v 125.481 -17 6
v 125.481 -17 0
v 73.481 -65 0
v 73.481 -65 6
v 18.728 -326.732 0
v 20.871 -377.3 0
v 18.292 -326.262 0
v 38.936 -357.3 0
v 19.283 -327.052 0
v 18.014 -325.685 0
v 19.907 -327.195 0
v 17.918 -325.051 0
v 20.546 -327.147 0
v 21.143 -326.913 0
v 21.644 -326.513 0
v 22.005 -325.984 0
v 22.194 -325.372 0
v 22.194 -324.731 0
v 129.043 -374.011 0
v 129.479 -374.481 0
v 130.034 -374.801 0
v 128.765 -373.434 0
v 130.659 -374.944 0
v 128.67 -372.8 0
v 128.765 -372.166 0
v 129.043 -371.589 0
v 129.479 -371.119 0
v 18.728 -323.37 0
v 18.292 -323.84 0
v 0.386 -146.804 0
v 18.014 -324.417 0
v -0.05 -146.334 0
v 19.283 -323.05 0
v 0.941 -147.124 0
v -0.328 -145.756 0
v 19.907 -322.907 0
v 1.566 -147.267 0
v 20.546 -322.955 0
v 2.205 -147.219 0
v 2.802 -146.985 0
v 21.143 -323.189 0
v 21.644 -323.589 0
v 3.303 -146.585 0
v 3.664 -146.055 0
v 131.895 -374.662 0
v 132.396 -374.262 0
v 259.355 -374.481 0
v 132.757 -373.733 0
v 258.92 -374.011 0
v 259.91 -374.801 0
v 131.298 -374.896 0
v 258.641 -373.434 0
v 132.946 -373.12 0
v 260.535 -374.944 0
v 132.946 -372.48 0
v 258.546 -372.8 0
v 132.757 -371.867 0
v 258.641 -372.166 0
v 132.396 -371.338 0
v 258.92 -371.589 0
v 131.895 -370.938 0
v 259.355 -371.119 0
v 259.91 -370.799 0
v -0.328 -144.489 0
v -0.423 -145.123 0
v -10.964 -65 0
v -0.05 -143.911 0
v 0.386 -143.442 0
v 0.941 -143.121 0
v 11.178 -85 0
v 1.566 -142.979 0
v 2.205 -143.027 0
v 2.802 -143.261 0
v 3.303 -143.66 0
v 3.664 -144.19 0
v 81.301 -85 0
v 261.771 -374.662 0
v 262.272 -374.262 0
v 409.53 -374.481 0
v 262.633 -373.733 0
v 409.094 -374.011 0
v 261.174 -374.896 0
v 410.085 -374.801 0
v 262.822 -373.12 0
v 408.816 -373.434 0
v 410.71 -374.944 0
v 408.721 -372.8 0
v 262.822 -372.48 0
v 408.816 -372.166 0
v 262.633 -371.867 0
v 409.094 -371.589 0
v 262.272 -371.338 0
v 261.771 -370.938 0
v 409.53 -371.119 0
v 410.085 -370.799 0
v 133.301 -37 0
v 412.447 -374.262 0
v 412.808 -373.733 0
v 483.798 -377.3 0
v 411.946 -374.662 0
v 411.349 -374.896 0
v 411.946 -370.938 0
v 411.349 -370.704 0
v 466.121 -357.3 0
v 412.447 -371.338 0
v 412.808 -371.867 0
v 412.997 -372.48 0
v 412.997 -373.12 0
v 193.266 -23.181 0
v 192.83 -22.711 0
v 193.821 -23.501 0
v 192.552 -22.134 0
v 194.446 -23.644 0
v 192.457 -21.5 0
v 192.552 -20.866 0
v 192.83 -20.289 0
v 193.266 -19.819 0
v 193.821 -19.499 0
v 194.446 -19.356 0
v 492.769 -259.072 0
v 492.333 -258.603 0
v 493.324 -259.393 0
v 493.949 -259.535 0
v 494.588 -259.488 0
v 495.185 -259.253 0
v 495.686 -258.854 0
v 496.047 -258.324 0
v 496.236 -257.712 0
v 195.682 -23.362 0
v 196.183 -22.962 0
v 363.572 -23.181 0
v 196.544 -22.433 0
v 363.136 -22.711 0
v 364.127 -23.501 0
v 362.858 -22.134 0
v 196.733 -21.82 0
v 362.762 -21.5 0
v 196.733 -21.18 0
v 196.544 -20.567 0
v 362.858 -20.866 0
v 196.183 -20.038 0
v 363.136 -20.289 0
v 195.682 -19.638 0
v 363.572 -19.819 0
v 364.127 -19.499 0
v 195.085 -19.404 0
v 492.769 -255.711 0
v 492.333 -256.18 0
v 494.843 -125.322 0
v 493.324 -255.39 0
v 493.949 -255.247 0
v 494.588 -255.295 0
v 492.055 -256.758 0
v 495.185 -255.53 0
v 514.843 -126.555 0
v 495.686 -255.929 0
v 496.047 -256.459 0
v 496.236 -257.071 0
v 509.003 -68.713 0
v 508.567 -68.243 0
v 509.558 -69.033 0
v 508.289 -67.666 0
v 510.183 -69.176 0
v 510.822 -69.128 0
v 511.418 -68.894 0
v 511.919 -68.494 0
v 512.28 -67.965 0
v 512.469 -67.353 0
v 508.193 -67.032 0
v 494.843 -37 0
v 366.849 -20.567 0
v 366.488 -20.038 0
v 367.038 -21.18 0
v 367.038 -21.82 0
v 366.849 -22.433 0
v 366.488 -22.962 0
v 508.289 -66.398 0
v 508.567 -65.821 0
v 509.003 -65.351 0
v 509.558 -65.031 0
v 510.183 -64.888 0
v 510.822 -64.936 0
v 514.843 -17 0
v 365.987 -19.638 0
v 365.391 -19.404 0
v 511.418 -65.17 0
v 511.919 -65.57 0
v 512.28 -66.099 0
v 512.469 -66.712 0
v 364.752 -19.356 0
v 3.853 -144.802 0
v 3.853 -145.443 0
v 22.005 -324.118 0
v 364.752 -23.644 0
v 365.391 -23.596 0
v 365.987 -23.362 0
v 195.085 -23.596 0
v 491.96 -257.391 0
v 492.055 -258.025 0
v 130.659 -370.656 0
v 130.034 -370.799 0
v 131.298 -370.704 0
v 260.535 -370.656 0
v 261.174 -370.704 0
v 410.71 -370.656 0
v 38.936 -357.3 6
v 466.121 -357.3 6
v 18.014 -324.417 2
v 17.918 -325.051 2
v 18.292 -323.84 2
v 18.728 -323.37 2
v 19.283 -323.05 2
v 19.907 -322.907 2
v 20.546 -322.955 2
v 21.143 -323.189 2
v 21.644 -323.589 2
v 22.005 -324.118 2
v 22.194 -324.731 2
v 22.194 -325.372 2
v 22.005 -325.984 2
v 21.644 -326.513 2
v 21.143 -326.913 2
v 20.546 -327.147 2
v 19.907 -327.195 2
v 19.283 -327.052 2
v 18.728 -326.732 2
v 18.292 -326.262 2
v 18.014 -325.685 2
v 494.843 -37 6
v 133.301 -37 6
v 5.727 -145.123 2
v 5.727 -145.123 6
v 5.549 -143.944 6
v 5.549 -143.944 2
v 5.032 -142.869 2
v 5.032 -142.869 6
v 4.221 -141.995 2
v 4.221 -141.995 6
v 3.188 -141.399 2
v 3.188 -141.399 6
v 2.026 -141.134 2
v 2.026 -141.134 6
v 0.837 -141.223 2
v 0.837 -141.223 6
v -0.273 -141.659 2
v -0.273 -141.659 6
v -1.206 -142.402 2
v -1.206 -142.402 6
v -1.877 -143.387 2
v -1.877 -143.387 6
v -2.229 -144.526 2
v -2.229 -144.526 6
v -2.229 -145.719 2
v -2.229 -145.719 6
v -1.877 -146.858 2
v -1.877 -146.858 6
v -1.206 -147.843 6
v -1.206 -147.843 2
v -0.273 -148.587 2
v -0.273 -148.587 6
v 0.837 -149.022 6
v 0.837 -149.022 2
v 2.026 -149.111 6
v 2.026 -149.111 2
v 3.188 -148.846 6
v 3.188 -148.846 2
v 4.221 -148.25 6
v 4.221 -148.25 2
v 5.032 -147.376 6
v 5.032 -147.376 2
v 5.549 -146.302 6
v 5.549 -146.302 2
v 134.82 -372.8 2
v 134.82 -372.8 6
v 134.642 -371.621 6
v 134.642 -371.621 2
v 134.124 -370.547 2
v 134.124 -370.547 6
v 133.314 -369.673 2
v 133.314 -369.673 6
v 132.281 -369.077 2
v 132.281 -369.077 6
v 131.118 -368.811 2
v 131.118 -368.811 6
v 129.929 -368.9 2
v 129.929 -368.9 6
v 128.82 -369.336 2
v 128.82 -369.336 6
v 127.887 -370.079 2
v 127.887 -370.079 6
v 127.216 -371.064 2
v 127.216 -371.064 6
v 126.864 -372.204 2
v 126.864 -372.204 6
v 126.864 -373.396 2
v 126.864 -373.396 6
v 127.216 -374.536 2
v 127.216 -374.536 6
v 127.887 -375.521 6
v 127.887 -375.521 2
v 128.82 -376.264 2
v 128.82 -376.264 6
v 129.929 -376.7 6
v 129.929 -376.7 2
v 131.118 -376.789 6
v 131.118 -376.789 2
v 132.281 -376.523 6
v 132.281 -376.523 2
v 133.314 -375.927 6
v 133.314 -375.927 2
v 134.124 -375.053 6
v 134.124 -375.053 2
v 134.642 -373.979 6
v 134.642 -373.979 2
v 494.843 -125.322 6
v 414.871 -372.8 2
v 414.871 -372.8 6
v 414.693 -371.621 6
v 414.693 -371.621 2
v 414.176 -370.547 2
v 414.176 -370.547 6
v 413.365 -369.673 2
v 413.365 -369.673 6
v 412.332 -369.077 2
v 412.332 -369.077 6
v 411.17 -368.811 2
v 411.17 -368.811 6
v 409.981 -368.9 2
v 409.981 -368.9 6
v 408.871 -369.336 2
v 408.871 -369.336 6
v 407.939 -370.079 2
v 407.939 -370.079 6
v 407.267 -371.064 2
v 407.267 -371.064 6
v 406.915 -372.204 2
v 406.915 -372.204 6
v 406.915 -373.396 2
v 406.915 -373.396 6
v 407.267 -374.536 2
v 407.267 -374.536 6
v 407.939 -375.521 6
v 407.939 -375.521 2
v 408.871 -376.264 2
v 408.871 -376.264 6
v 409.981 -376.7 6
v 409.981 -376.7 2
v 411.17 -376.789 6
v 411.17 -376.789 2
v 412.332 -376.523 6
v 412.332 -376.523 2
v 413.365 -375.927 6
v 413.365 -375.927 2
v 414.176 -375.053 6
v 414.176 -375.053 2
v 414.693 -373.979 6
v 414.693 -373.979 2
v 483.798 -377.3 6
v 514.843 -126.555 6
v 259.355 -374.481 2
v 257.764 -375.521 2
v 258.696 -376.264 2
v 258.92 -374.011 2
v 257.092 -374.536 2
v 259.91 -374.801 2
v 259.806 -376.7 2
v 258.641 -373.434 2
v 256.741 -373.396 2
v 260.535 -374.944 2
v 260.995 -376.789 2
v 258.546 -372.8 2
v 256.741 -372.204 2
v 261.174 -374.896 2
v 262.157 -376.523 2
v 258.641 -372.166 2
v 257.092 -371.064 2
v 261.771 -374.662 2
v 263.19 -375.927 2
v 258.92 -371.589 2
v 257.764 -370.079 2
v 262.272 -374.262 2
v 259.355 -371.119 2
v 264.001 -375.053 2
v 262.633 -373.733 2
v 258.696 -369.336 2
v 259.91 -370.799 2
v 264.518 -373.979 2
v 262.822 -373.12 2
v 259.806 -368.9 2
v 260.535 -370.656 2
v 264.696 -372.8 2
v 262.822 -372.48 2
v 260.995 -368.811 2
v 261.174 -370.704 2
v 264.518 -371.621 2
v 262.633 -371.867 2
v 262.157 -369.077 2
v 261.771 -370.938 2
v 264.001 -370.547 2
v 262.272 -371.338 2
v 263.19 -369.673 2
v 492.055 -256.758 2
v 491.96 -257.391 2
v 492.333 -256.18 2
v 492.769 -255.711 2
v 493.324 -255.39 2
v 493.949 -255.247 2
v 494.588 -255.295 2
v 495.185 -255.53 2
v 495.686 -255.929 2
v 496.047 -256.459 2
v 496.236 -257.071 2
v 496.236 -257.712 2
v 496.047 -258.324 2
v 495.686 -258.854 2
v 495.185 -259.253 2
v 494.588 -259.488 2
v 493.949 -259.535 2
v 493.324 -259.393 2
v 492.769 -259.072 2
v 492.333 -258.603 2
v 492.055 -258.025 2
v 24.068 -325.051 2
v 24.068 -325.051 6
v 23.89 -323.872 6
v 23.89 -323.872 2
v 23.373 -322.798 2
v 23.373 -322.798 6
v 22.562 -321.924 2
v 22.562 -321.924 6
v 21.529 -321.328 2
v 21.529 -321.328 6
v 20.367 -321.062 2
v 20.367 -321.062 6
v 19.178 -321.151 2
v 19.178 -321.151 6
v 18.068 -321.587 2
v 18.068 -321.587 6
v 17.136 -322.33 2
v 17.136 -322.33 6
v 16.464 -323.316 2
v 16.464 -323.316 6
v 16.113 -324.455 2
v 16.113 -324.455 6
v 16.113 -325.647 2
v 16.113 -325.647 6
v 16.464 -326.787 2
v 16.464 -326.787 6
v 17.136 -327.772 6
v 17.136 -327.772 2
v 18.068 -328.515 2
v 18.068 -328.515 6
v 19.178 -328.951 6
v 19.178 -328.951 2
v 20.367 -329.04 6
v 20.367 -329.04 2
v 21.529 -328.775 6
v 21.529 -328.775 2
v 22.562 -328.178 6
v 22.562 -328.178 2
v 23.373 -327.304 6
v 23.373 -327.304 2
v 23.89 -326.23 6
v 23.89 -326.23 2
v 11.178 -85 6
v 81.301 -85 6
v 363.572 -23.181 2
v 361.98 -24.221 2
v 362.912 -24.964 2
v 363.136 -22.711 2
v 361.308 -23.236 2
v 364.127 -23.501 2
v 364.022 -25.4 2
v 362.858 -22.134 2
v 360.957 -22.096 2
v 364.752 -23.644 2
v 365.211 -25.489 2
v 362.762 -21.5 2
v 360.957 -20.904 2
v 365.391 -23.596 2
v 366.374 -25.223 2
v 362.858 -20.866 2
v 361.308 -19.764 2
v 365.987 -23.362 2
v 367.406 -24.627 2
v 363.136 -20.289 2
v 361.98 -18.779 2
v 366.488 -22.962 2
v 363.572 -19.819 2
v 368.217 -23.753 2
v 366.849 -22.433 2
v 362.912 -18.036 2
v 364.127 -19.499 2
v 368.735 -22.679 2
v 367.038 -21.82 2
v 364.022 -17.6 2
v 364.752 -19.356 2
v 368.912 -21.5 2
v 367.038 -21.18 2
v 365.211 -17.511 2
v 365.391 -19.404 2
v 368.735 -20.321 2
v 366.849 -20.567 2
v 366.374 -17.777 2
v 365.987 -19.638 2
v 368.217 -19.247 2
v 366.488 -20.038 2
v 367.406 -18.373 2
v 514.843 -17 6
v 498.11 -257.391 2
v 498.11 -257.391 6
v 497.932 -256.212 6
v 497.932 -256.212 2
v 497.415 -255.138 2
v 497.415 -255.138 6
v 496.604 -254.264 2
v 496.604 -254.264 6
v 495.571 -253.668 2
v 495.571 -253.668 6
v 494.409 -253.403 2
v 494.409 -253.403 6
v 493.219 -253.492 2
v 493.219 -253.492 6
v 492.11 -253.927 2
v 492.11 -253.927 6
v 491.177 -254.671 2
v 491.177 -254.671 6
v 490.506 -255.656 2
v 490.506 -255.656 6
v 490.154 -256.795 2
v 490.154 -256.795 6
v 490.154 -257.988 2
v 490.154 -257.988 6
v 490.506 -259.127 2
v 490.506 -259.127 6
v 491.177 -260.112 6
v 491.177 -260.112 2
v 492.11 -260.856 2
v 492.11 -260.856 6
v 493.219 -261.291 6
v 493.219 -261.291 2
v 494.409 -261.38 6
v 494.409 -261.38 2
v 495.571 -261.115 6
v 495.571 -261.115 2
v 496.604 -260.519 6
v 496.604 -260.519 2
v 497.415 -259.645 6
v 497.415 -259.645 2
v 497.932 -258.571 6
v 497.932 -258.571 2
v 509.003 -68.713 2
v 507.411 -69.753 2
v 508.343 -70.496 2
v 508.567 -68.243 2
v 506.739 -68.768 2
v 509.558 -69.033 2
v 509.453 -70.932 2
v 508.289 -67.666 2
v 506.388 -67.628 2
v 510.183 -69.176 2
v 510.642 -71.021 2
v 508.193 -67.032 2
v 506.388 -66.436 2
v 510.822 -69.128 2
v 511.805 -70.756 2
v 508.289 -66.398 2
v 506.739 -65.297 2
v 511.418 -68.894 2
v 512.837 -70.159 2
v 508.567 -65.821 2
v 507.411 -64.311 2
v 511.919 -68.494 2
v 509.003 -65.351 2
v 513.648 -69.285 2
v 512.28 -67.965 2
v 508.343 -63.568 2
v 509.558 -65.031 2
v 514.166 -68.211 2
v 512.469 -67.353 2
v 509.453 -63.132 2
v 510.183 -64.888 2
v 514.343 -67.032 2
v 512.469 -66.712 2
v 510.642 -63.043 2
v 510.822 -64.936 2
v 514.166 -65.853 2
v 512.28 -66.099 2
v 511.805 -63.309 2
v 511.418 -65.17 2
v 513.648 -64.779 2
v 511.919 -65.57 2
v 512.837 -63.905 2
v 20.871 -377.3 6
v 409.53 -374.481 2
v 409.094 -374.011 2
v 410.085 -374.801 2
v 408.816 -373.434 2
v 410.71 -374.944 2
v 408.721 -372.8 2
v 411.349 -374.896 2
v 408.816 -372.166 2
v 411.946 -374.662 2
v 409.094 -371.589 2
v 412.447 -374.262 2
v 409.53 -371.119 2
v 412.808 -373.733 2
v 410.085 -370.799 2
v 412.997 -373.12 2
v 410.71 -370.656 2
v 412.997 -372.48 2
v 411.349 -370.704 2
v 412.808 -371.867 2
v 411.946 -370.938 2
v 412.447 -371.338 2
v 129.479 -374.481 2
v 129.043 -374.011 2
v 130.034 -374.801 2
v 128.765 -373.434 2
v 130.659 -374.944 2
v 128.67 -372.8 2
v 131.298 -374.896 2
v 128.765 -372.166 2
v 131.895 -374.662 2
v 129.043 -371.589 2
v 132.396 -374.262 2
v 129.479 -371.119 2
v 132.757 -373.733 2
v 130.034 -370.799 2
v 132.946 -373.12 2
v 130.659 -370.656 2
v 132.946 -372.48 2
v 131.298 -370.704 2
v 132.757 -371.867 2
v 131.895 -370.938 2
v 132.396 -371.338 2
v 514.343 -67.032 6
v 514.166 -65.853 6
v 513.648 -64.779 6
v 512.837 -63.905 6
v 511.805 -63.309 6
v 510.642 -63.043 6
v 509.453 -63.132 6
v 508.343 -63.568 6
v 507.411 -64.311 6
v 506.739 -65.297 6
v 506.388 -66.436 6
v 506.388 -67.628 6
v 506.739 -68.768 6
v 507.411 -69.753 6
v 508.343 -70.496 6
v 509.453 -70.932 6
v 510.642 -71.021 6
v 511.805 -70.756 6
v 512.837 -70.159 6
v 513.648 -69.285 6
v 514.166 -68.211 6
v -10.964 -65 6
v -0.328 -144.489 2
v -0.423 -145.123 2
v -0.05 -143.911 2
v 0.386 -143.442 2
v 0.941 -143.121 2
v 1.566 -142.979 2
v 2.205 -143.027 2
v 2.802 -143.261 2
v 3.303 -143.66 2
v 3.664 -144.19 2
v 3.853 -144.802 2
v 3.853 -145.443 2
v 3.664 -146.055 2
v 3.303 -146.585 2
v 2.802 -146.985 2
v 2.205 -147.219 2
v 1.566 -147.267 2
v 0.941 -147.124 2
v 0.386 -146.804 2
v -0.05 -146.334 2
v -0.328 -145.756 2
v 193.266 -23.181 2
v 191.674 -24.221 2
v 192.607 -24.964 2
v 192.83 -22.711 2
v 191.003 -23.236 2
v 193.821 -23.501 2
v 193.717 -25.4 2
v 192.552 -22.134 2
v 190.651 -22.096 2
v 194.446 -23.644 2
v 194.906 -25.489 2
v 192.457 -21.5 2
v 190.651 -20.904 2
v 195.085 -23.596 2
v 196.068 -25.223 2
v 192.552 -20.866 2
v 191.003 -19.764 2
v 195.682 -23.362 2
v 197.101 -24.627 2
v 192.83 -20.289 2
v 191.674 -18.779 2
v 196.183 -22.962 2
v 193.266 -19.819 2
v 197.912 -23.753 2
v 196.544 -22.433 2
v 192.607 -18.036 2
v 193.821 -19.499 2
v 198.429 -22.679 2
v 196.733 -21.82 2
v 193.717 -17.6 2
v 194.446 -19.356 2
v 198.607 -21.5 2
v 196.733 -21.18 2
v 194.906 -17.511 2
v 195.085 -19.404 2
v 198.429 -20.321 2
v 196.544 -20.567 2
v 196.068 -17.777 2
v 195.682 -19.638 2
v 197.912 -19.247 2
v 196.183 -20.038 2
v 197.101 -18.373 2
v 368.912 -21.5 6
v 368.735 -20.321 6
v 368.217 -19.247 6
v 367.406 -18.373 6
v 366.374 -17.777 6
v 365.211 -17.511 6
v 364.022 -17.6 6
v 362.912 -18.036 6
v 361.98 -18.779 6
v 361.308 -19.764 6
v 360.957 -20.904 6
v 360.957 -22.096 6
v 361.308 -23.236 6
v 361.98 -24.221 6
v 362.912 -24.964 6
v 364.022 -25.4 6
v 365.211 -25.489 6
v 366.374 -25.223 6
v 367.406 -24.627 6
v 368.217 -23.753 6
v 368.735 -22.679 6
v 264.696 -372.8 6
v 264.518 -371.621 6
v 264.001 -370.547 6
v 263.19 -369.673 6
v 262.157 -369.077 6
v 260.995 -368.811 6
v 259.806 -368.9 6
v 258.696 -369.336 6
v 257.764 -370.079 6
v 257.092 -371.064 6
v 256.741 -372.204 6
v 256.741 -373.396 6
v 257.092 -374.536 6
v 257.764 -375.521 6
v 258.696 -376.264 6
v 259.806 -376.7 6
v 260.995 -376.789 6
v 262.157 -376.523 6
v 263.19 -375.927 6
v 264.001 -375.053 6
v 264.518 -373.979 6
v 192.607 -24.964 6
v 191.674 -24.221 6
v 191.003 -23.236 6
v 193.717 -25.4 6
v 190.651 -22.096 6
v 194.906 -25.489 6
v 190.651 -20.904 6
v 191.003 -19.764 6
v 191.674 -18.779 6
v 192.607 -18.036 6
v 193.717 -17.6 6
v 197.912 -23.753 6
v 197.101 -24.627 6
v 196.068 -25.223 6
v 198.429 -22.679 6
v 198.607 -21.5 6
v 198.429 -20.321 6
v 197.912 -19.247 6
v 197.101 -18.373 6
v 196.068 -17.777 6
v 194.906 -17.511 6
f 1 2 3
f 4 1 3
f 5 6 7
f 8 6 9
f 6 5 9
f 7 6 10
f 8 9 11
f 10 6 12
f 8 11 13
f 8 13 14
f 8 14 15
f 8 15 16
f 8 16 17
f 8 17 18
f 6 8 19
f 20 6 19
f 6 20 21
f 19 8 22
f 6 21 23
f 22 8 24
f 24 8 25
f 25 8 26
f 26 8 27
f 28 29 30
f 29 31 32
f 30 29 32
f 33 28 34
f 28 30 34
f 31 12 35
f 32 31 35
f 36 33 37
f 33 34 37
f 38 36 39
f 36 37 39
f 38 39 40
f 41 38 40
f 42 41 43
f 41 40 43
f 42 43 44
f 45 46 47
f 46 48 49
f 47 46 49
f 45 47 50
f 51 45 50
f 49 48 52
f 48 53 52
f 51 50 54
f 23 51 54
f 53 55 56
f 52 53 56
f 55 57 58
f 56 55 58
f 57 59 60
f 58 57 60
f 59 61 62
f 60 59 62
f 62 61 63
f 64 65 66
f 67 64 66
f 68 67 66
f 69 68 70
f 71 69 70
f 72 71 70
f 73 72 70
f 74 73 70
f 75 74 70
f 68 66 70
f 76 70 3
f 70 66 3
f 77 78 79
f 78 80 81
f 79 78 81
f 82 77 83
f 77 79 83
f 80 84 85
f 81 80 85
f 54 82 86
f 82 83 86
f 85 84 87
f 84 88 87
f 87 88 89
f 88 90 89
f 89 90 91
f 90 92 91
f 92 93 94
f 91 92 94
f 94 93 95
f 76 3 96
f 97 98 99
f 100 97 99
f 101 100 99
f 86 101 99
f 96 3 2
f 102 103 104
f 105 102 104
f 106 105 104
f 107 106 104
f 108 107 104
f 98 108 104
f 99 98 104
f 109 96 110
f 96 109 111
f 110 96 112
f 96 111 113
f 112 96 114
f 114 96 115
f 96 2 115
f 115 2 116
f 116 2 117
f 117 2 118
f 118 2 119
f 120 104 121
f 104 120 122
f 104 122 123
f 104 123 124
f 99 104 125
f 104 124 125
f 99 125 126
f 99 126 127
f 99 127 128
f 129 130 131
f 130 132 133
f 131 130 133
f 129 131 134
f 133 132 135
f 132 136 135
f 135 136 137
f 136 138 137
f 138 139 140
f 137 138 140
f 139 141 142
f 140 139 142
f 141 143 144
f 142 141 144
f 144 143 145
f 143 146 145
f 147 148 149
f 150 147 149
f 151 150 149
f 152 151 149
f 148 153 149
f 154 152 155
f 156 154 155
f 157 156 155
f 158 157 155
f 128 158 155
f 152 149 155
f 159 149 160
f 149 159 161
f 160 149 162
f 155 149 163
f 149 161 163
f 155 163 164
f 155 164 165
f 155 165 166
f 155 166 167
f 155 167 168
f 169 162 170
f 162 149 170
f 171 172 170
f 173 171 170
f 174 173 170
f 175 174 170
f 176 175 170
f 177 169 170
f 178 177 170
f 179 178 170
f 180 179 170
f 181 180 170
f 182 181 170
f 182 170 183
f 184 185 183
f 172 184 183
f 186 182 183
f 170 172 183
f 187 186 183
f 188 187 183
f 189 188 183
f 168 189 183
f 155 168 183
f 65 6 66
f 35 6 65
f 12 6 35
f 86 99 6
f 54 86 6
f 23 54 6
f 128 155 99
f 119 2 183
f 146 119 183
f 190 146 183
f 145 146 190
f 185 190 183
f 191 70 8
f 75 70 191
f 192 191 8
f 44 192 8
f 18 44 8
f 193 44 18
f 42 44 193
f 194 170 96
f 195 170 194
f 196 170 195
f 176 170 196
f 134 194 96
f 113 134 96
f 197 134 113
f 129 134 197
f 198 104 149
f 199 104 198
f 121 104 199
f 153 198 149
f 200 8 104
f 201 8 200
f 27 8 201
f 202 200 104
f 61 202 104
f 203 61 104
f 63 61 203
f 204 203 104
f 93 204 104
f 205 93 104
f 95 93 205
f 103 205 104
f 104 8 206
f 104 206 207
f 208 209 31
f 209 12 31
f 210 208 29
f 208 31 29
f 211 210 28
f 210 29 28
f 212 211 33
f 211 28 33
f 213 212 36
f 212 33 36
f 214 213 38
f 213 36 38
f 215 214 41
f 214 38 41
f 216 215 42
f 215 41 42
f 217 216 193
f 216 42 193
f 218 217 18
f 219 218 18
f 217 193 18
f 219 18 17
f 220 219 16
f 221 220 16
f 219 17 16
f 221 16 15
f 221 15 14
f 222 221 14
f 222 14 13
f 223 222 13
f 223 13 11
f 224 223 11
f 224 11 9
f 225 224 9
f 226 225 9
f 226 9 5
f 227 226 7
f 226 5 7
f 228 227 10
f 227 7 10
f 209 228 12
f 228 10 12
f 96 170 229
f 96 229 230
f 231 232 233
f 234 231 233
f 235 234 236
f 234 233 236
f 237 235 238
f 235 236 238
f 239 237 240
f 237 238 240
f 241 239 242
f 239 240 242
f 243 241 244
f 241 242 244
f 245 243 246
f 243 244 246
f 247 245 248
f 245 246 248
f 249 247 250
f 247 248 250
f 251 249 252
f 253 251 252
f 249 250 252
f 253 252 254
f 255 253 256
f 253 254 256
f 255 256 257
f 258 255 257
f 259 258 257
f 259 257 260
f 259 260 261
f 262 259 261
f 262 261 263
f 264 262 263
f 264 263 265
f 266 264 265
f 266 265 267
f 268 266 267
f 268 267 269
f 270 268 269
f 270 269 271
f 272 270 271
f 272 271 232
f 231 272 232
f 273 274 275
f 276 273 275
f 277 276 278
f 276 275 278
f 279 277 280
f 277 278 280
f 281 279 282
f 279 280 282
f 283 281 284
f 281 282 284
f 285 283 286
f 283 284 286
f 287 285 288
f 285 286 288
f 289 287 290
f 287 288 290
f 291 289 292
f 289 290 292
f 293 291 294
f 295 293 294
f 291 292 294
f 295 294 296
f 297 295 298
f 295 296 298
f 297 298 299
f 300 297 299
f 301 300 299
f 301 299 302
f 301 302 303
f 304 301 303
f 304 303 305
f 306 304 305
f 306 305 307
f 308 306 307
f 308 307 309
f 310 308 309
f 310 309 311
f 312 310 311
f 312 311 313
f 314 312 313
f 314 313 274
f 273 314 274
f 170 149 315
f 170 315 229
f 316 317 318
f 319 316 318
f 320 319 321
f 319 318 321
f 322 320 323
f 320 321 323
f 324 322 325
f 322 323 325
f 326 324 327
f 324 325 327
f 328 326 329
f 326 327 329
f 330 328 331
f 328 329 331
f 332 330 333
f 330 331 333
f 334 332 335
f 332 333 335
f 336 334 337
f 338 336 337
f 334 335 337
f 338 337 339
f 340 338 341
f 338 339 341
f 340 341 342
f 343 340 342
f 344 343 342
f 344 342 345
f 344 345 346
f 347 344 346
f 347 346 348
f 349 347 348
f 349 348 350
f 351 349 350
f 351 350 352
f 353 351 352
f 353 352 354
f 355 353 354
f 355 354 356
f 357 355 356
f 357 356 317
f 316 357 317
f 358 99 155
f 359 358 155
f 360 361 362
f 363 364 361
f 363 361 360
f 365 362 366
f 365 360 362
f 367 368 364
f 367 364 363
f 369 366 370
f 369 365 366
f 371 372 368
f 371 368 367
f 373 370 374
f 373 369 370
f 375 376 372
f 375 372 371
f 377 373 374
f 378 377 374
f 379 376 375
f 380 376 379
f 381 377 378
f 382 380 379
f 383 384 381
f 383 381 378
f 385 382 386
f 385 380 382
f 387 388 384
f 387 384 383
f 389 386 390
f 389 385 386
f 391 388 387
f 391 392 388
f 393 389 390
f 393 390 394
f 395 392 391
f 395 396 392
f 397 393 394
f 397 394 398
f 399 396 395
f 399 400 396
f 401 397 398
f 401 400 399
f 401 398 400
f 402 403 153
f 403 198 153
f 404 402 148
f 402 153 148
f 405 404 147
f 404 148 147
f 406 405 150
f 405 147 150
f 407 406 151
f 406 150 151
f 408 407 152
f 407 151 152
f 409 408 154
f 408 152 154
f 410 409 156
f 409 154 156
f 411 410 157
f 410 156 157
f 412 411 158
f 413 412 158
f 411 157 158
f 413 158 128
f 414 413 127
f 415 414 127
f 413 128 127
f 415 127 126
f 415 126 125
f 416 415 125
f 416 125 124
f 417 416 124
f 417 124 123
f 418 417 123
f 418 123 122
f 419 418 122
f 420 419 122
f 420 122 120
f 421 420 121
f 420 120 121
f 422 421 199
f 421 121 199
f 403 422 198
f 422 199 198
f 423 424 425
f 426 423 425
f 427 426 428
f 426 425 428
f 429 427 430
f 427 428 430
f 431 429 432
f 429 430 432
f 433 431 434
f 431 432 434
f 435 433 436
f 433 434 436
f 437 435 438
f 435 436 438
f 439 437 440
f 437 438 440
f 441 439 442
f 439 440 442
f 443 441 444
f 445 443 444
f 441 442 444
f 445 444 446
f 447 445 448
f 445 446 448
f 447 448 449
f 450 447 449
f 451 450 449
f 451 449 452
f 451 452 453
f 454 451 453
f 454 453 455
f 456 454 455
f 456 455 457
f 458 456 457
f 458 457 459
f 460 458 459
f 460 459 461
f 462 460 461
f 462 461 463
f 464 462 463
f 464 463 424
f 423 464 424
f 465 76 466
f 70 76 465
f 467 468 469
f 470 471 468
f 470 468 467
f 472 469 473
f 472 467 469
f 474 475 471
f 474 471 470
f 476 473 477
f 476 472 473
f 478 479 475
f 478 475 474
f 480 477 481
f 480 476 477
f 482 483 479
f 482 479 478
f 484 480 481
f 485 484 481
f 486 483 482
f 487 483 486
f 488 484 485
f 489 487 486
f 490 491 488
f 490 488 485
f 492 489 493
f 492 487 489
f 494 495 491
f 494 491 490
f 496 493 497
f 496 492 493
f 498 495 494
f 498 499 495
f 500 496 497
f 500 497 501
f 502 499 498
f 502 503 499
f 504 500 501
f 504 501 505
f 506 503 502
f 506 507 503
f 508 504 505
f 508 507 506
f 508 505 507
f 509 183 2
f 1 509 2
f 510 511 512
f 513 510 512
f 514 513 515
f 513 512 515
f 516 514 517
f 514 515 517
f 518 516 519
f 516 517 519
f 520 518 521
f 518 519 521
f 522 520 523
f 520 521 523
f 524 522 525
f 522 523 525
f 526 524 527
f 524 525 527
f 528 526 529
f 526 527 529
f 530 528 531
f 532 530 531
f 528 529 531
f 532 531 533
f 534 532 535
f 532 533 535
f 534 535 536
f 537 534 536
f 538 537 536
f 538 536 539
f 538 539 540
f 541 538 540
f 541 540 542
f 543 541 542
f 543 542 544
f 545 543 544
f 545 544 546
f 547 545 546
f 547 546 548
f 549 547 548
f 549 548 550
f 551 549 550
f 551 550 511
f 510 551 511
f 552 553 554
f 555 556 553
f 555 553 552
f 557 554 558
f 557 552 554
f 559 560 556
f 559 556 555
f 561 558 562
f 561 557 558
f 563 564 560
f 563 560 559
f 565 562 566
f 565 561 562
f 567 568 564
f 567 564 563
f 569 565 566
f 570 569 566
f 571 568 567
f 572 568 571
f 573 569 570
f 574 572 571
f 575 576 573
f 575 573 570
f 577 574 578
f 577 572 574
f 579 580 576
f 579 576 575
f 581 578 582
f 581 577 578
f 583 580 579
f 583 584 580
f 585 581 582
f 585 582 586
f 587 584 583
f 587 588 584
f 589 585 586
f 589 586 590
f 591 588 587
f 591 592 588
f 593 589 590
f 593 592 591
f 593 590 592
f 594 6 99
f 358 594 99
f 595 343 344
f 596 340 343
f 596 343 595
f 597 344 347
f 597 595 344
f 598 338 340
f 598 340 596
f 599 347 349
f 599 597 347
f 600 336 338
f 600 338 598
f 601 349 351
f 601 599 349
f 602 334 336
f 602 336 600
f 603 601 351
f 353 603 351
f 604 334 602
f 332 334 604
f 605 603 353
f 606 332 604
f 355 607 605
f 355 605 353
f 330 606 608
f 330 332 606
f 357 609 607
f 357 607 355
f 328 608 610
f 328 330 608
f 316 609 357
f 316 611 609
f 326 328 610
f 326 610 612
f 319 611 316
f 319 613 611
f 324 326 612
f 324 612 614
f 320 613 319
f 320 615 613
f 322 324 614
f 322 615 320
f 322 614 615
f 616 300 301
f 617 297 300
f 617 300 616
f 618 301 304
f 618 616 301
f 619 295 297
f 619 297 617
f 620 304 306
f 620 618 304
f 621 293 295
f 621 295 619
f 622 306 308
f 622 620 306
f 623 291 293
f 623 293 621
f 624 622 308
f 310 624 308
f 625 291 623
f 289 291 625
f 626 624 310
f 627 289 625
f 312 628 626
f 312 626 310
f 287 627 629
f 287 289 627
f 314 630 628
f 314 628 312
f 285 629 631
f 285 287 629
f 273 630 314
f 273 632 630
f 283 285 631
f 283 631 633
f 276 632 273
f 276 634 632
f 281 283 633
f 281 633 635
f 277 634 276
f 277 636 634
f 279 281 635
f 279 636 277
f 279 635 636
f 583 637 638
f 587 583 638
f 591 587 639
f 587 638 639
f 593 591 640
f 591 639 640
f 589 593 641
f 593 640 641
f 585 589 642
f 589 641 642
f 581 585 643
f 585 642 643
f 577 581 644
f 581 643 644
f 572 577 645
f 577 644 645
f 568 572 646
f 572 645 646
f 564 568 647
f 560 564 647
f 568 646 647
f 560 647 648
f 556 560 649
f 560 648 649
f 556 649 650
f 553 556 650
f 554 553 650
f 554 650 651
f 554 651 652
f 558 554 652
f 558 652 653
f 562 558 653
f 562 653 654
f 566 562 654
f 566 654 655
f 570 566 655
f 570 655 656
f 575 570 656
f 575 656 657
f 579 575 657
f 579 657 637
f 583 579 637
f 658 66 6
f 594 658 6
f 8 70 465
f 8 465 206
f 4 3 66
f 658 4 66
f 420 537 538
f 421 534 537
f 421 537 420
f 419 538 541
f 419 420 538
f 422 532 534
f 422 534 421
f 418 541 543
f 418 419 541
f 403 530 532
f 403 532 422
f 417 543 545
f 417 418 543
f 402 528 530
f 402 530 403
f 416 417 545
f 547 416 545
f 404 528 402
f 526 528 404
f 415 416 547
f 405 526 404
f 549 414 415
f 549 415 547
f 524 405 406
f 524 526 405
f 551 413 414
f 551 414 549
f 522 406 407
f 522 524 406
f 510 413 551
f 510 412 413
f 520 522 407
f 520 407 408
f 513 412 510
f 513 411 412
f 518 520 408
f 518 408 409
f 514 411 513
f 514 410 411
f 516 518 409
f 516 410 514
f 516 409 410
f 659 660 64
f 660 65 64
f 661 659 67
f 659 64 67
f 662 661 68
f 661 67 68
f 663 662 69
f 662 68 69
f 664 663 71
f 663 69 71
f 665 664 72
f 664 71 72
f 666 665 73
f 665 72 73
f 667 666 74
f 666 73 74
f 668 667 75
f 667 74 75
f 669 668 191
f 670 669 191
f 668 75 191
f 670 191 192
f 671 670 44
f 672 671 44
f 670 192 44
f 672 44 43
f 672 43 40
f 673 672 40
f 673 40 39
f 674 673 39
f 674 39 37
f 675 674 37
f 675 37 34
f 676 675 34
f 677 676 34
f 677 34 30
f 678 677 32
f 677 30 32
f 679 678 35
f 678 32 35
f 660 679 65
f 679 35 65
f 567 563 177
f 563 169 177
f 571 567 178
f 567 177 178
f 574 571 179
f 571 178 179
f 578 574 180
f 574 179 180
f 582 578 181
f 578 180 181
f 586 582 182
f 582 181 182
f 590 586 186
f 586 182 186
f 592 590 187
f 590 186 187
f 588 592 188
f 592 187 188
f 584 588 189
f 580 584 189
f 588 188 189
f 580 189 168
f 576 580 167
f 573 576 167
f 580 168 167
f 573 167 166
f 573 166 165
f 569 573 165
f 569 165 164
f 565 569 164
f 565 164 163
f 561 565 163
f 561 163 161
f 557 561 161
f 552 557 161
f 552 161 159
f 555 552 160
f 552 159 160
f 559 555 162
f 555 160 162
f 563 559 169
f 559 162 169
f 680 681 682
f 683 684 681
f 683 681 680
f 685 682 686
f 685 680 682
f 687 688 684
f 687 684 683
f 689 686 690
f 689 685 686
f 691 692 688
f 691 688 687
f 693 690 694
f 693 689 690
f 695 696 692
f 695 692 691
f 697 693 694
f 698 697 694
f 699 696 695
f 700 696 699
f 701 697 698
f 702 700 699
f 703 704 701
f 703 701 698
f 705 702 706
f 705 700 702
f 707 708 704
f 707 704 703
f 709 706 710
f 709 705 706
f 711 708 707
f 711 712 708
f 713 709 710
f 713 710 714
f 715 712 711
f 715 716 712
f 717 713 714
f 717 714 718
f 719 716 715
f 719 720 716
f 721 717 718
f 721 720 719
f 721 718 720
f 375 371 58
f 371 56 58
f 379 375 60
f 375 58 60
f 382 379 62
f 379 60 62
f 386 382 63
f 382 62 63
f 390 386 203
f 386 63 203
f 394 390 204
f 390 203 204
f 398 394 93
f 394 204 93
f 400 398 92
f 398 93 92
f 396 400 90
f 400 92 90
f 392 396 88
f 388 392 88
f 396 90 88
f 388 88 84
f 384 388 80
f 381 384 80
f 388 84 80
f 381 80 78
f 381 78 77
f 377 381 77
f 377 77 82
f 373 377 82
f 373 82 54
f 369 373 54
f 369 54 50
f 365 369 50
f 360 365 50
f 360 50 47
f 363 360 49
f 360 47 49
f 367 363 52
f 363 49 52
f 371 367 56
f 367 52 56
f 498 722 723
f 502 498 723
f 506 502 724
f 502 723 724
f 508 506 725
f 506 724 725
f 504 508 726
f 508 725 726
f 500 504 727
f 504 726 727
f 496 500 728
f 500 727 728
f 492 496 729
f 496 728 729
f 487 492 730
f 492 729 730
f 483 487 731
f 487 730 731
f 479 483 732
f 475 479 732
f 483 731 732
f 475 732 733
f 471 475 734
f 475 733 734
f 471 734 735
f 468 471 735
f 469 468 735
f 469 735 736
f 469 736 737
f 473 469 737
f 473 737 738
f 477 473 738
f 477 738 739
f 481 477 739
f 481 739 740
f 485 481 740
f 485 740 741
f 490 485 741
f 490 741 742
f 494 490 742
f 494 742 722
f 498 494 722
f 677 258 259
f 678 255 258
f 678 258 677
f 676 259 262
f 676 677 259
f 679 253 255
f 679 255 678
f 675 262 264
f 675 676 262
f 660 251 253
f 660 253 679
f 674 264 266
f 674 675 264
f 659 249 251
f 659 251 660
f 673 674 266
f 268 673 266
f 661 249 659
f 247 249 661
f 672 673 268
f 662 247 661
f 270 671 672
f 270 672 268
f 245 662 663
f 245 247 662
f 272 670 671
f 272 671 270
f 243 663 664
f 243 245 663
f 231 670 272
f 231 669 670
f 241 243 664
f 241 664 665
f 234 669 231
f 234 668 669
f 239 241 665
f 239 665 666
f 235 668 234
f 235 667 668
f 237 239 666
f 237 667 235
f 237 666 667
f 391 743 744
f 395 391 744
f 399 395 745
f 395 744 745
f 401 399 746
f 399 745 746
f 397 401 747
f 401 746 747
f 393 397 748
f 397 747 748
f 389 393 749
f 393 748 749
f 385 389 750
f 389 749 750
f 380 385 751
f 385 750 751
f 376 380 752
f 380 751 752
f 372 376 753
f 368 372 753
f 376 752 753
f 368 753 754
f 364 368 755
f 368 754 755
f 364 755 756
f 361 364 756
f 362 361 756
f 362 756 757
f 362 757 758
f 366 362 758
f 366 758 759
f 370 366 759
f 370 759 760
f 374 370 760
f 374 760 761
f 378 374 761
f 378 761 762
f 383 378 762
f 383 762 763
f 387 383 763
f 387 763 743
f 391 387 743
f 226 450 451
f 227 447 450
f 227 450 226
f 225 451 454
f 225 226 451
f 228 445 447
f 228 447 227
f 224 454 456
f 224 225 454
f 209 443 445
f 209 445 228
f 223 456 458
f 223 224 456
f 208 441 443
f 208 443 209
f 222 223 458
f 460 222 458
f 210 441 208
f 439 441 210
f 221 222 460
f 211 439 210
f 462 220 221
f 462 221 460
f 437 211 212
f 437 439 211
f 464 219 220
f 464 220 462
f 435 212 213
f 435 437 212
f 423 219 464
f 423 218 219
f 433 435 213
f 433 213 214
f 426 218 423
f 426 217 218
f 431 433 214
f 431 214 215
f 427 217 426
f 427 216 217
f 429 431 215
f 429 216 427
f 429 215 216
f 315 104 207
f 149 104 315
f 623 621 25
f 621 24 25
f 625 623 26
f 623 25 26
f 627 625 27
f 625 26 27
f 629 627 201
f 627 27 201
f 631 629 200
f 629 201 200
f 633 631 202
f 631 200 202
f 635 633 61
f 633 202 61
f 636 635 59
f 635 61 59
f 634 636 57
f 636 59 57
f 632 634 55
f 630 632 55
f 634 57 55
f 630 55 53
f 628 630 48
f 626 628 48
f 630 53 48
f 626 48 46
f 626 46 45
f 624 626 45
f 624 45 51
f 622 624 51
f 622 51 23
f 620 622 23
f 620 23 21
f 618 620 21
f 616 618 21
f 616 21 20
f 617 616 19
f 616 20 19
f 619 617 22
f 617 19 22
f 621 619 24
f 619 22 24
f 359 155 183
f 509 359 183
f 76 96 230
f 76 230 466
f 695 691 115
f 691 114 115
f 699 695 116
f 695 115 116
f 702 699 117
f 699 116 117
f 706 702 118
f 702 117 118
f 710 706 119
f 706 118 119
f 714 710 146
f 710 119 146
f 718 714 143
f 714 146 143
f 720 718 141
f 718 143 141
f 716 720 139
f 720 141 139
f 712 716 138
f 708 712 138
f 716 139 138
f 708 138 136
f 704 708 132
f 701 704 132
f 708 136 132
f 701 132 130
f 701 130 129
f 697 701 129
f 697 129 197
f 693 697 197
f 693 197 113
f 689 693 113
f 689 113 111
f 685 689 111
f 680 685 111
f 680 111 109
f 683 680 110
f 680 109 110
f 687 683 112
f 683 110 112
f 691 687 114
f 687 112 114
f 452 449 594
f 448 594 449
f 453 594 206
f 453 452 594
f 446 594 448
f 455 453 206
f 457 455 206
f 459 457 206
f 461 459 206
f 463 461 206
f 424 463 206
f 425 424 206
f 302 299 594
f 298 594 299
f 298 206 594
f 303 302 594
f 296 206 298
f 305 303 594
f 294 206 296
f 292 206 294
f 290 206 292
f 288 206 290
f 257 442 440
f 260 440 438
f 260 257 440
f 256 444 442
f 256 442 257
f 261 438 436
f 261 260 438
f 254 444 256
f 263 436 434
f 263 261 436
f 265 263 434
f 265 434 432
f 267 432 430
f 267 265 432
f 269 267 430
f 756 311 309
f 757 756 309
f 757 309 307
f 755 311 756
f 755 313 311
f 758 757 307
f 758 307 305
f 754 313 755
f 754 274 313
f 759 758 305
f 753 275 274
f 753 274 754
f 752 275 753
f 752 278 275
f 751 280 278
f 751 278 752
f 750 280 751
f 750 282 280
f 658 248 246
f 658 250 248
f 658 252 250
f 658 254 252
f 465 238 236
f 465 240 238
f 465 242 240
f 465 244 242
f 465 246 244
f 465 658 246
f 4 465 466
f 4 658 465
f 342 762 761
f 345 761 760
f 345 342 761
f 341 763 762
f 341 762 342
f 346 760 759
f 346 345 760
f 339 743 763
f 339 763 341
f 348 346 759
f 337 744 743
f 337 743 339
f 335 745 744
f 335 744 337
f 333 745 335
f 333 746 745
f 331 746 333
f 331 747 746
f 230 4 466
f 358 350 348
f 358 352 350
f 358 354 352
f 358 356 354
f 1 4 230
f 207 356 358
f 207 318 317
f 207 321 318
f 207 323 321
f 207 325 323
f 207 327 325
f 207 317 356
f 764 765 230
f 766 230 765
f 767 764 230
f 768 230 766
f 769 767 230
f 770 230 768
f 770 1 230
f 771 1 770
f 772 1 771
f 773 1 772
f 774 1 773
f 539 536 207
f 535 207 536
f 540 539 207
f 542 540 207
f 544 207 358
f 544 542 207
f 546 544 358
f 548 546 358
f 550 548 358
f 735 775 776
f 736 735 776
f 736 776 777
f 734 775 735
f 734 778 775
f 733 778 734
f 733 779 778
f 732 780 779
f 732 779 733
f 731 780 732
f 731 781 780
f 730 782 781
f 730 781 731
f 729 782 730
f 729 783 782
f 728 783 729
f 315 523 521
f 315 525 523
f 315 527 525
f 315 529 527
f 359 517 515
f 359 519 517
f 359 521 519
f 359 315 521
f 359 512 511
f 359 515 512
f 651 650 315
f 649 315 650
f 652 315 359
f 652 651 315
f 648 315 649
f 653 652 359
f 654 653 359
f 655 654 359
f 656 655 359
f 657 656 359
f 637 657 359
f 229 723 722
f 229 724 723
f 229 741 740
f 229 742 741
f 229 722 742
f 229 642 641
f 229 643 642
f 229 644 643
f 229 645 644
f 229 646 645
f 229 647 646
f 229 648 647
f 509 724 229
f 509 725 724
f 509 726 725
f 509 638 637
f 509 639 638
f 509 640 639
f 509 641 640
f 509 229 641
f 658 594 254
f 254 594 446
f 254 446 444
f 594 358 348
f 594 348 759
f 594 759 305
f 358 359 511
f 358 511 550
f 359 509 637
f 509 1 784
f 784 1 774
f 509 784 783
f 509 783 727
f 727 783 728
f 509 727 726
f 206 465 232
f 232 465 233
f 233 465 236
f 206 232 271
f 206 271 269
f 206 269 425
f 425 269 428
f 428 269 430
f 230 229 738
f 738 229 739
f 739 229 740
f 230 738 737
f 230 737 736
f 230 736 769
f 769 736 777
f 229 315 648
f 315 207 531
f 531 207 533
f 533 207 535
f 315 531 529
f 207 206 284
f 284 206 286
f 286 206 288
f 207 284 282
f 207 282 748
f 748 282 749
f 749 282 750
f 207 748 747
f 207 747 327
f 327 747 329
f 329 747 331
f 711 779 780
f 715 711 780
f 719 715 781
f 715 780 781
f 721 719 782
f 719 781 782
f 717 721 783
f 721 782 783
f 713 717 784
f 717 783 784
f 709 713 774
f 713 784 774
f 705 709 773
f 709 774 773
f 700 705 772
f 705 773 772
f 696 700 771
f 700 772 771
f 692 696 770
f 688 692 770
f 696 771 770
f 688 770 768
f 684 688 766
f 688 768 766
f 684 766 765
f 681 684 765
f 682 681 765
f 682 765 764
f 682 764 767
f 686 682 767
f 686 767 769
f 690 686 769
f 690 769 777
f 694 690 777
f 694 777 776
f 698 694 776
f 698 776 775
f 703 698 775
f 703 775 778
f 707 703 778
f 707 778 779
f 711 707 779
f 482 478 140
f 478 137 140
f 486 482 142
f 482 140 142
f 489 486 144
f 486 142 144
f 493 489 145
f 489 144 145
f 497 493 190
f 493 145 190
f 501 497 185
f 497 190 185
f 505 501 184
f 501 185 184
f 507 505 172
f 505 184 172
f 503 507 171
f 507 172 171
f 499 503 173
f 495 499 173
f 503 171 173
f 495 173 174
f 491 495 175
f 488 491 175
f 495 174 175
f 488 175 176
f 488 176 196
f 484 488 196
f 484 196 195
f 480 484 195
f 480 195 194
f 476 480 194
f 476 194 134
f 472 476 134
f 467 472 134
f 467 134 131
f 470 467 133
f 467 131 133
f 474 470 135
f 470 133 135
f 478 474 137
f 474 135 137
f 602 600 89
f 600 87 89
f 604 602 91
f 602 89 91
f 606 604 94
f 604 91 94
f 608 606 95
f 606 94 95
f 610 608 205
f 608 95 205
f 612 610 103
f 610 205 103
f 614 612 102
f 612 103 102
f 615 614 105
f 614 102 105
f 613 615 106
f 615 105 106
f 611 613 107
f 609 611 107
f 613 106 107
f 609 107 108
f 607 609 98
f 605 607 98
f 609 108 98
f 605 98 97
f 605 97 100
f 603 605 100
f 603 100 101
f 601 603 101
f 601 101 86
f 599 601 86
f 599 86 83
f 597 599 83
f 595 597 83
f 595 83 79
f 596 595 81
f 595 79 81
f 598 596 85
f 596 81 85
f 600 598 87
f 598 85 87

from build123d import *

# Parameters (mm, degrees)
BOSS_EXTRU_1_DEPTH                              = 6
CHAMBRAGE_POUR_VIS_T_TE_CYLINDRIQUE_D           = 4.3
CHAMBRAGE_POUR_VIS_T_TE_CYLINDRIQUE_DEPTH       = 14
CHAMBRAGE_POUR_VIS_T_TE_CYLINDRIQUE_CBORE_D     = 8
CHAMBRAGE_POUR_VIS_T_TE_CYLINDRIQUE_CBORE_DEPTH = 4
CHAMBRAGE_POUR_VIS_T_TE_CYLINDRIQUE_TIP         = 1.291850331


with BuildPart() as part:
    # Esquisse2 → Boss.-Extru.1 (new body)
    with BuildSketch(Plane.XY):
        Polygon((-10.964070347, -65), (20.870792038, -377.3), (483.797653512, -377.3), (514.843253, -126.55504147), (514.843253, -17), (125.48114549, -17), (73.48114549, -65), align=None)
        Polygon((11.178308202, -85), (38.93569862, -357.3), (466.12120793, -357.3), (494.843253, -125.321615981), (494.843253, -37), (133.300822179, -37), (81.300822179, -85), align=None, mode=Mode.SUBTRACT)
    extrude(amount=BOSS_EXTRU_1_DEPTH)

    # Chambrage pour vis à tête cylindrique à 6 pans creux (ou vis CHC) M41
    with Locations(Plane.XY.offset(6)):
        with Locations((1.726692055, -145.122614111), (20.068025449, -325.051094707), (130.819543848, -372.8), (260.695946352, -372.8), (410.870792038, -372.8), (494.109580684, -257.391480805), (510.343253, -67.032082447), (364.912339867, -21.5), (194.606610564, -21.5)):
            CounterBoreHole(CHAMBRAGE_POUR_VIS_T_TE_CYLINDRIQUE_D / 2, CHAMBRAGE_POUR_VIS_T_TE_CYLINDRIQUE_CBORE_D / 2, CHAMBRAGE_POUR_VIS_T_TE_CYLINDRIQUE_CBORE_DEPTH, depth=CHAMBRAGE_POUR_VIS_T_TE_CYLINDRIQUE_DEPTH)
            with Locations((0, 0, -(CHAMBRAGE_POUR_VIS_T_TE_CYLINDRIQUE_DEPTH + CHAMBRAGE_POUR_VIS_T_TE_CYLINDRIQUE_TIP / 2))):  # 118° drill point
                Cone(0, CHAMBRAGE_POUR_VIS_T_TE_CYLINDRIQUE_D / 2, CHAMBRAGE_POUR_VIS_T_TE_CYLINDRIQUE_TIP, mode=Mode.SUBTRACT)


solid = part.part
